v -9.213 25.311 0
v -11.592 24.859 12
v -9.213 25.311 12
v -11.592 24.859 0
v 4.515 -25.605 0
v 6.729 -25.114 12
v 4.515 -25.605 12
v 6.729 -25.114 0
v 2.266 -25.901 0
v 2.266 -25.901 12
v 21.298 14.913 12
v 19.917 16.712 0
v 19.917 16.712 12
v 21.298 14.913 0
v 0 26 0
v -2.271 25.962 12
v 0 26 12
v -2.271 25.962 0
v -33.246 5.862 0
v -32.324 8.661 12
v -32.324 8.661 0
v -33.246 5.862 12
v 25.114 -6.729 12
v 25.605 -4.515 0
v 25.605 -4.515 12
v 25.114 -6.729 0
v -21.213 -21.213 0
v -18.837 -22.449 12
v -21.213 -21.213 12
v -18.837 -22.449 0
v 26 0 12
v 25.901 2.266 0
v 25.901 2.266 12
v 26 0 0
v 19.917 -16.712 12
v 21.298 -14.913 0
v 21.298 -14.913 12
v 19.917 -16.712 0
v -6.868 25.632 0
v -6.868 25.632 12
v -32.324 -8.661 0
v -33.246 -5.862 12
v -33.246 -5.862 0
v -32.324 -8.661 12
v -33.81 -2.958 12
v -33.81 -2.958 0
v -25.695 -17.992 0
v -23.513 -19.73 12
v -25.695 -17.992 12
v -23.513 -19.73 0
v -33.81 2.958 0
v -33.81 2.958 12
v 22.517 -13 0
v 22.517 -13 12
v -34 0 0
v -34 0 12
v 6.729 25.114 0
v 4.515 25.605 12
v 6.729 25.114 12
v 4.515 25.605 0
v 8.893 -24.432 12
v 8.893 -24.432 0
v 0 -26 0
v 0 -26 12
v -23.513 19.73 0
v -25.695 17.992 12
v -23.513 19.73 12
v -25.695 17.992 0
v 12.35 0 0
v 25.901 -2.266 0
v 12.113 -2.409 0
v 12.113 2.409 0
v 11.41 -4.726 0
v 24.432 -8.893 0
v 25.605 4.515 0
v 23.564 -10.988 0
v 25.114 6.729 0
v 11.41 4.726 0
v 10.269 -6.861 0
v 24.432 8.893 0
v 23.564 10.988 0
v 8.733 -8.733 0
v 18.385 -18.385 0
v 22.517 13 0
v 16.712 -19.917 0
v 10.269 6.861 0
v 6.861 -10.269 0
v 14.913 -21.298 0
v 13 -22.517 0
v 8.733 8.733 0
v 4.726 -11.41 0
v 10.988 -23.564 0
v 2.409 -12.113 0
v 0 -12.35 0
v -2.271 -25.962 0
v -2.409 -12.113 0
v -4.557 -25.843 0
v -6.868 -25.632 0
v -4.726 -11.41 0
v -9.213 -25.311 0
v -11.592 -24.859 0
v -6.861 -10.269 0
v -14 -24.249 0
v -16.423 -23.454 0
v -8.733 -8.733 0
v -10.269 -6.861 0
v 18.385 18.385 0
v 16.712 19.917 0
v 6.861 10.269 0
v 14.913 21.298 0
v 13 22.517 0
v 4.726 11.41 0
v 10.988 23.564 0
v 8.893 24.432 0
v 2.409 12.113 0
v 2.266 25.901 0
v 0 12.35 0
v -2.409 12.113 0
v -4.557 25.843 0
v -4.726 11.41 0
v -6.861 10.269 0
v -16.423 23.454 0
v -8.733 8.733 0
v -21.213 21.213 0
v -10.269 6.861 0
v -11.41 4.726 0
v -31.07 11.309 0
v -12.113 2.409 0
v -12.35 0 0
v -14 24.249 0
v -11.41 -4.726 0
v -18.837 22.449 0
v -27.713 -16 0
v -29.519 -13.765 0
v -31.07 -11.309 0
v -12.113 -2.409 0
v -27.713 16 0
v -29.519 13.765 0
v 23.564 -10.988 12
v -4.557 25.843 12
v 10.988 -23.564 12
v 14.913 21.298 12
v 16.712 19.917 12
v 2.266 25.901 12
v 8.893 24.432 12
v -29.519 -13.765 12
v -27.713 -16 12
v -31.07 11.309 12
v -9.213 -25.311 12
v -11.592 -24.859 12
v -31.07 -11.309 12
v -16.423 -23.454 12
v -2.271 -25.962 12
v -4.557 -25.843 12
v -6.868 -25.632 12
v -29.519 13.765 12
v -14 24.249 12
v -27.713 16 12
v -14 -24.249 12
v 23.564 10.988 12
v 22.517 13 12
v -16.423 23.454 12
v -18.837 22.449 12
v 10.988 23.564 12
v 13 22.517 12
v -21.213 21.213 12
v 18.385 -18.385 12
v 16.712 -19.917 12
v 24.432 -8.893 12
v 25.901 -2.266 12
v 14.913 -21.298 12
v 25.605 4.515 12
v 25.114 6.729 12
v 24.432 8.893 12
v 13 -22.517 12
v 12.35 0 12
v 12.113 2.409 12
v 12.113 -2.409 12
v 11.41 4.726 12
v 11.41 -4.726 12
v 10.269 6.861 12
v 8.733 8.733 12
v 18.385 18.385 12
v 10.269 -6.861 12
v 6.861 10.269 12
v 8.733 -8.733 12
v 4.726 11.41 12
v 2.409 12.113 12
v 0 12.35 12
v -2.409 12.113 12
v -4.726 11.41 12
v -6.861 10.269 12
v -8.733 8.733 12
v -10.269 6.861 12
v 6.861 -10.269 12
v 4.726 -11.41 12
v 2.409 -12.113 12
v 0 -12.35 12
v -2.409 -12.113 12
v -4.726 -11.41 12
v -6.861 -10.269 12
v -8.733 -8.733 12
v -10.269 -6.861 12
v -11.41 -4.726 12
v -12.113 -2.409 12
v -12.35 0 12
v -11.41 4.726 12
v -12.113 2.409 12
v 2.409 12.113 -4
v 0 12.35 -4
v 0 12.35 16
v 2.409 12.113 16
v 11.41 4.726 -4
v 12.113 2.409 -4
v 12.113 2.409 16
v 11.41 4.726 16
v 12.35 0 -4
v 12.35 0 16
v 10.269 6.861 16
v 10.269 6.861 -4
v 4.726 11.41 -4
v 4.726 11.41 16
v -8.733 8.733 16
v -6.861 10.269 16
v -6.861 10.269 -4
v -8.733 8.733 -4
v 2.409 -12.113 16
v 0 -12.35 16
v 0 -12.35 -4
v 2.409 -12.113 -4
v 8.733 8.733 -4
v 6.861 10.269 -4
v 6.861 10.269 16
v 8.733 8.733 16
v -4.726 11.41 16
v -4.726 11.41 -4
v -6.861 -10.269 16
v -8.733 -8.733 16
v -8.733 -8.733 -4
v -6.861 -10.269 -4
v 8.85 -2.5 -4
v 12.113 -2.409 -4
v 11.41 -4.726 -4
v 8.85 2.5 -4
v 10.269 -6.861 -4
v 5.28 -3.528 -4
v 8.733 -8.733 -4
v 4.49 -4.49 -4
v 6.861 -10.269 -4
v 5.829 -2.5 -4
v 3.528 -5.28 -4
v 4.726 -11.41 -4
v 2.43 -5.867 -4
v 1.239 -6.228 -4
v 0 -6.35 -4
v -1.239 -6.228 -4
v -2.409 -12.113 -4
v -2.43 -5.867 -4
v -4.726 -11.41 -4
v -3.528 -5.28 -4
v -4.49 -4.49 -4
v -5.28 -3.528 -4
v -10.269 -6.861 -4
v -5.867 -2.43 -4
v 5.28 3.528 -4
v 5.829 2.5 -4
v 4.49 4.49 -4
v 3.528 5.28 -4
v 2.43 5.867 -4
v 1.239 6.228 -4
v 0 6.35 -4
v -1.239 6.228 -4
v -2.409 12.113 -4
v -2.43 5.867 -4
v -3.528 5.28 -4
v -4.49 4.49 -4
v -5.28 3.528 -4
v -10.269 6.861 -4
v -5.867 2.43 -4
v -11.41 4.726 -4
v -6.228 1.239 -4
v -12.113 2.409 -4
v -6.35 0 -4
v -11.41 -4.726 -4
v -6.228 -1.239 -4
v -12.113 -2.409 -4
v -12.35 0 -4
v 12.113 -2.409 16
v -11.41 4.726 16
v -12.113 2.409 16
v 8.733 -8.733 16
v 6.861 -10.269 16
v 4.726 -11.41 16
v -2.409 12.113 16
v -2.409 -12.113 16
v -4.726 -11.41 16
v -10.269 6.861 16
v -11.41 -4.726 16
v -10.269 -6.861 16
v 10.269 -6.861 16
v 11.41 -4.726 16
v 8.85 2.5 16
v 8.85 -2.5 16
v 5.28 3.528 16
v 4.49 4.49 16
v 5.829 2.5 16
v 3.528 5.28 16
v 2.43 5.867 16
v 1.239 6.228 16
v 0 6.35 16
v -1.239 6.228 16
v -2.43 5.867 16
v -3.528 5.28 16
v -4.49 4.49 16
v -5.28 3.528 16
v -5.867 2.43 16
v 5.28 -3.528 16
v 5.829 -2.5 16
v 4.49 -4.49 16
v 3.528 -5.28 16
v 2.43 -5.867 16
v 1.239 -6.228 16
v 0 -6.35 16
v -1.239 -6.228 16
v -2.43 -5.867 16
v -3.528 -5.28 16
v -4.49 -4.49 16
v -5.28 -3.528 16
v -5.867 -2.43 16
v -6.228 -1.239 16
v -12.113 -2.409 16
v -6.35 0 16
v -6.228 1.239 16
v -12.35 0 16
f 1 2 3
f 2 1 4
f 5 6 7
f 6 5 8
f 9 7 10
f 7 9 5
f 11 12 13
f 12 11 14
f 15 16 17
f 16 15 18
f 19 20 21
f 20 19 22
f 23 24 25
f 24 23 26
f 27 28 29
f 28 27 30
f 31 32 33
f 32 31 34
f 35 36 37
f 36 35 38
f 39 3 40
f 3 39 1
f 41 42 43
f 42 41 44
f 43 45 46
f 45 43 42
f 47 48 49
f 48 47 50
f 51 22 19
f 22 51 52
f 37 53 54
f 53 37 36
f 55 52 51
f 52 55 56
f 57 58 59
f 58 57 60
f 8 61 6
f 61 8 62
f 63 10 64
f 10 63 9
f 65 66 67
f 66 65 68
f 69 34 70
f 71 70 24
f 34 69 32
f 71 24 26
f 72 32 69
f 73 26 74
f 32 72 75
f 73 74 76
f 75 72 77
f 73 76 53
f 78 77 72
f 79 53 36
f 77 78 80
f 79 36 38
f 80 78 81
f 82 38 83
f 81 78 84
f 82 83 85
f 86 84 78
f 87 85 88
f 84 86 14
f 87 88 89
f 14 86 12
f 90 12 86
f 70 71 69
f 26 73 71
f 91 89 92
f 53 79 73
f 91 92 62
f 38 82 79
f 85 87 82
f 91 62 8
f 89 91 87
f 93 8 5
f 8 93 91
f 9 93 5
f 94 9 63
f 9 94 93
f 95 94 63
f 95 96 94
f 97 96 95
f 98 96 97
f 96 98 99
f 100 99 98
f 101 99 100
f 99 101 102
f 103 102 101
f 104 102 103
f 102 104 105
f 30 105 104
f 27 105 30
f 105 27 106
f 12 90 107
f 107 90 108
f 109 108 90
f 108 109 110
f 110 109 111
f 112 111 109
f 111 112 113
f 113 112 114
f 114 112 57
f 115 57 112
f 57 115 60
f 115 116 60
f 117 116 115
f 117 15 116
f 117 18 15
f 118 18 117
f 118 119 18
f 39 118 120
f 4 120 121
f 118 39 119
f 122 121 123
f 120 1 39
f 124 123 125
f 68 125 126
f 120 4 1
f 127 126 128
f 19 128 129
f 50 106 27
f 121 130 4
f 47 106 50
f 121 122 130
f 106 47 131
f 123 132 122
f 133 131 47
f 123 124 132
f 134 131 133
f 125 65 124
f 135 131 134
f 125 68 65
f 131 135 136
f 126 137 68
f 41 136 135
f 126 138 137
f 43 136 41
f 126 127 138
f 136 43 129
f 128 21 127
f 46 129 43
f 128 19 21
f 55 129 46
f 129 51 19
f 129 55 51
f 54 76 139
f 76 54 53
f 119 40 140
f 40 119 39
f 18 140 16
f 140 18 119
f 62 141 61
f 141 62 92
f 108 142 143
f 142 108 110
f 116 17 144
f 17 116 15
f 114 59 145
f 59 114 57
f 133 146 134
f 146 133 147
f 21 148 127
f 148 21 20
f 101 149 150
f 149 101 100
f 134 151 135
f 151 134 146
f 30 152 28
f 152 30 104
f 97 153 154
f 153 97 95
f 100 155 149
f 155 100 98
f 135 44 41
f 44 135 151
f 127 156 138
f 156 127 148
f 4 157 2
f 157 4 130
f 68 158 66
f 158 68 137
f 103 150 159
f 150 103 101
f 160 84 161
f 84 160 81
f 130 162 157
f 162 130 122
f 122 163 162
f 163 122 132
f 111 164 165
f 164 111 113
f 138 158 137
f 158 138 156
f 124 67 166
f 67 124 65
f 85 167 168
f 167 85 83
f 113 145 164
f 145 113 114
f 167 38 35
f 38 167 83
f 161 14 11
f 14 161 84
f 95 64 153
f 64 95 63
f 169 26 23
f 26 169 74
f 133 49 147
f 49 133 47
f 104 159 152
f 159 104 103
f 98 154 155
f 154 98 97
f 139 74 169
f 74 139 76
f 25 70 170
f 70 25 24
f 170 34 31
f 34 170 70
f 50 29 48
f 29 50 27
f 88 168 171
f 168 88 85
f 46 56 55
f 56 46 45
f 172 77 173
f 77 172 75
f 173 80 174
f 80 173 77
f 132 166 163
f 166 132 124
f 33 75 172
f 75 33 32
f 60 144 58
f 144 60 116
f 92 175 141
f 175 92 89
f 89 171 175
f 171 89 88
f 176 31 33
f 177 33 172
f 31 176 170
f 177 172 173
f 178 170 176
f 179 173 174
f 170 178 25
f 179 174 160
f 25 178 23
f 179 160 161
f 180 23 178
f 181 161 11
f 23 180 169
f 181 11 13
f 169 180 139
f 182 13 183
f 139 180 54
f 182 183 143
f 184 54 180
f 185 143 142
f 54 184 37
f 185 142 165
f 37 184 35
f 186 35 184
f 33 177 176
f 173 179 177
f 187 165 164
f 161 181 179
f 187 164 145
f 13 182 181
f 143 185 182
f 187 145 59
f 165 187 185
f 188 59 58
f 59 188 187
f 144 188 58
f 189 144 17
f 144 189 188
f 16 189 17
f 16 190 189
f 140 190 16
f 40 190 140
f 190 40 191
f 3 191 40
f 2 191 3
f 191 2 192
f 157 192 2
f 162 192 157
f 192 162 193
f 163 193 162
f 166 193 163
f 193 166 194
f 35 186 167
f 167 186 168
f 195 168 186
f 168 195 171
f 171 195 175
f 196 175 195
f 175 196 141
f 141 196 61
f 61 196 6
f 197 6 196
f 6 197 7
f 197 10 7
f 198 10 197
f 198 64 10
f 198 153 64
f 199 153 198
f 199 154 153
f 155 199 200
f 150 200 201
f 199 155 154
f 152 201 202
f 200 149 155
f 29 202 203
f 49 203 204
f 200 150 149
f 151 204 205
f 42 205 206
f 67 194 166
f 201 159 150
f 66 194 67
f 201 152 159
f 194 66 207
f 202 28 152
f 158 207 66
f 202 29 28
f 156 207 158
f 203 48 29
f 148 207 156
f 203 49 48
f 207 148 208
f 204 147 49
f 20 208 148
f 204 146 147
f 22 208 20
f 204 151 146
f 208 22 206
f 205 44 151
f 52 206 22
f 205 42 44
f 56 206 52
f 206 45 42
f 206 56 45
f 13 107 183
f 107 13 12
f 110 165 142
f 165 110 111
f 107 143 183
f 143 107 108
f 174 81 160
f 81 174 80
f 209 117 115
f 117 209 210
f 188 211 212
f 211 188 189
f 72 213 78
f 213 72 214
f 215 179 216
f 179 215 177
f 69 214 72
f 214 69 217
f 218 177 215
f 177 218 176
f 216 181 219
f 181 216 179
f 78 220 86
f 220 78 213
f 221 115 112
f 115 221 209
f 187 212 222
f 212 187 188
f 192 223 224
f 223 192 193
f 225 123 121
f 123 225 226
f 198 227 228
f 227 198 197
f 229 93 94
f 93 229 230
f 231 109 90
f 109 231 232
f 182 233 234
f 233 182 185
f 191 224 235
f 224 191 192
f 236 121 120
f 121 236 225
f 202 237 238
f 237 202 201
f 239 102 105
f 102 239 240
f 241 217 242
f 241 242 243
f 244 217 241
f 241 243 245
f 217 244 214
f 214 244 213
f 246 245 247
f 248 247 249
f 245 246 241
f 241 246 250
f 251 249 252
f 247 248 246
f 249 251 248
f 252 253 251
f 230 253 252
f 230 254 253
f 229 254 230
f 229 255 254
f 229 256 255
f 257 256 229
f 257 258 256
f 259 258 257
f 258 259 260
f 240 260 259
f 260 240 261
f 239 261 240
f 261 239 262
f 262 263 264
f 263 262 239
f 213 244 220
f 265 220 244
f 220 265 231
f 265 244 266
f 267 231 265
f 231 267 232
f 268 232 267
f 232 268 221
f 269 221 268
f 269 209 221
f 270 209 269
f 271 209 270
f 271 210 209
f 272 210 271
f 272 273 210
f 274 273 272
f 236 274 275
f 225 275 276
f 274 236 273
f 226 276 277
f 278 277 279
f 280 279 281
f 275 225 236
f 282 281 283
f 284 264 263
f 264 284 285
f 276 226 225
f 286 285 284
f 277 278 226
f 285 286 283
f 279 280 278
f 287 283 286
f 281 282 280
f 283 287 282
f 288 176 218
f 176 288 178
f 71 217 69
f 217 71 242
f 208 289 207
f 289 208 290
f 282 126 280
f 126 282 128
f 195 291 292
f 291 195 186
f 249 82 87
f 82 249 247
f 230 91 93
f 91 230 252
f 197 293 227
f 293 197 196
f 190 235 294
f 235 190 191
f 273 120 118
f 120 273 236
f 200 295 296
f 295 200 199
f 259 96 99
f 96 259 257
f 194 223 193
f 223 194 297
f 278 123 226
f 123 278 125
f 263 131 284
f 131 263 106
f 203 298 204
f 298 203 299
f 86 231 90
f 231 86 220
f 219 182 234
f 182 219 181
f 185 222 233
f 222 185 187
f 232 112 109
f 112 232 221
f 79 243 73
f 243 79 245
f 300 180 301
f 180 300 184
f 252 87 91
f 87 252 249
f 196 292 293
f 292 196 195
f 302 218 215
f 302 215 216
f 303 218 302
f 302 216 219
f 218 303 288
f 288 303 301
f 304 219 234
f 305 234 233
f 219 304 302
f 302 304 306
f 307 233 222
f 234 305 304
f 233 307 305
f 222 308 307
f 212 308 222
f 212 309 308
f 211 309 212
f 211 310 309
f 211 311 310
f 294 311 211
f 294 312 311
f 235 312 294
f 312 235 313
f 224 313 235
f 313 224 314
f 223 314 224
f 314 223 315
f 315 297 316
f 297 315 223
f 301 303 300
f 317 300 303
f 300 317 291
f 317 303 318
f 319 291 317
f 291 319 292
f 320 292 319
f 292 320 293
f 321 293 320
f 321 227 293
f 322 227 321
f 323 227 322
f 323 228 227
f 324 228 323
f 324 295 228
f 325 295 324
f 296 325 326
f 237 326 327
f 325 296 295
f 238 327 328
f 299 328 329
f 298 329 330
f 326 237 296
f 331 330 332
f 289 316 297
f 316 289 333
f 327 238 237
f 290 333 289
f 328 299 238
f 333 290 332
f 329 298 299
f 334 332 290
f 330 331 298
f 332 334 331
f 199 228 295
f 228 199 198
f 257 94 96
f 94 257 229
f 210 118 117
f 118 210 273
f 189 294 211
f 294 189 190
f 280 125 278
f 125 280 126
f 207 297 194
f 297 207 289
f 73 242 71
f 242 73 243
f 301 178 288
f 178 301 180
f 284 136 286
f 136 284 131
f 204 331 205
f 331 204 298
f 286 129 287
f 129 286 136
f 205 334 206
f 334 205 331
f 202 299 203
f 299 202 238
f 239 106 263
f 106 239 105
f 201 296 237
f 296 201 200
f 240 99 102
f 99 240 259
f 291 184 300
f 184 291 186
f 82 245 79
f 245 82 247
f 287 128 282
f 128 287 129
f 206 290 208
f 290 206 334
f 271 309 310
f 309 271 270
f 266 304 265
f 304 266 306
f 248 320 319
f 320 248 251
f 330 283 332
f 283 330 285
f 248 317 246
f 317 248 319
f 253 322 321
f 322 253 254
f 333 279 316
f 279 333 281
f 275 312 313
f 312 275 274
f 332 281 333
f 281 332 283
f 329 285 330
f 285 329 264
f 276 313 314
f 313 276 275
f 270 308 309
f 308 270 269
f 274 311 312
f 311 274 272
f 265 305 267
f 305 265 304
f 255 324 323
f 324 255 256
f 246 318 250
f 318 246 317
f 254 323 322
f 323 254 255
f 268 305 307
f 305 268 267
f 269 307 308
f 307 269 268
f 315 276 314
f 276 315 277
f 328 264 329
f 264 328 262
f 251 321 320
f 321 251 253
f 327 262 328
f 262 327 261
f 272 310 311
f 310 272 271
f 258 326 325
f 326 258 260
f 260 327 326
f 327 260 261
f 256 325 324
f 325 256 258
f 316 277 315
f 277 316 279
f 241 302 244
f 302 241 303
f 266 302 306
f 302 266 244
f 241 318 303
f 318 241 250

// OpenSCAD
$fn = 32;

// ----------------------------------------------------------------------
// Cam: base radius 26 mm with a 8 mm lift over 180 degrees
// ----------------------------------------------------------------------

// --- parameters (mm) ---
base_r = 26;              // base radius
lift = 8;                 // lift height above the base radius
lift_span = 180;          // angular width of the lift
lift_start = 90;          // angle where the lift starts
cam_t = 12;               // cam plate thickness
hub_d = 24.7;             // hub diameter
hub_h = 20;               // hub height
bore_d = 12.7;            // bore
key_w = 5;                // keyway width
key_depth = 2.5;          // keyway depth

cam_profile = [[26, 0], [25.901, 2.266], [25.605, 4.515], [25.114, 6.729], [24.432, 8.893], [23.564, 10.988], [22.517, 13], [21.298, 14.913], [19.917, 16.712], [18.385, 18.385], [16.712, 19.917], [14.913, 21.298], [13, 22.517], [10.988, 23.564], [8.893, 24.432], [6.729, 25.114], [4.515, 25.605], [2.266, 25.901], [0, 26], [-2.271, 25.962], [-4.557, 25.843], [-6.868, 25.632], [-9.213, 25.311], [-11.592, 24.859], [-14, 24.249], [-16.423, 23.454], [-18.837, 22.449], [-21.213, 21.213], [-23.513, 19.73], [-25.695, 17.992], [-27.713, 16], [-29.519, 13.765], [-31.07, 11.309], [-32.324, 8.661], [-33.246, 5.862], [-33.81, 2.958], [-34, 0], [-33.81, -2.958], [-33.246, -5.862], [-32.324, -8.661], [-31.07, -11.309], [-29.519, -13.765], [-27.713, -16], [-25.695, -17.992], [-23.513, -19.73], [-21.213, -21.213], [-18.837, -22.449], [-16.423, -23.454], [-14, -24.249], [-11.592, -24.859], [-9.213, -25.311], [-6.868, -25.632], [-4.557, -25.843], [-2.271, -25.962], [0, -26], [2.266, -25.901], [4.515, -25.605], [6.729, -25.114], [8.893, -24.432], [10.988, -23.564], [13, -22.517], [14.913, -21.298], [16.712, -19.917], [18.385, -18.385], [19.917, -16.712], [21.298, -14.913], [22.517, -13], [23.564, -10.988], [24.432, -8.893], [25.114, -6.729], [25.605, -4.515], [25.901, -2.266]];

difference() {
  union() {
    linear_extrude(height = cam_t) polygon(cam_profile);
    /* hub, proud of the cam plate on both sides */
    translate([0, 0, -4]) cylinder(h = hub_h, d = hub_d);
  }
  /* bore through the hub, 2.5 mm clear on both faces */
  translate([0, 0, -6.5]) cylinder(h = hub_h + 5, d = bore_d);
  /* keyway, milled through the whole hub */
  translate([3.85, -2.5, -6.5]) cube([5, 5, 25]);
}
